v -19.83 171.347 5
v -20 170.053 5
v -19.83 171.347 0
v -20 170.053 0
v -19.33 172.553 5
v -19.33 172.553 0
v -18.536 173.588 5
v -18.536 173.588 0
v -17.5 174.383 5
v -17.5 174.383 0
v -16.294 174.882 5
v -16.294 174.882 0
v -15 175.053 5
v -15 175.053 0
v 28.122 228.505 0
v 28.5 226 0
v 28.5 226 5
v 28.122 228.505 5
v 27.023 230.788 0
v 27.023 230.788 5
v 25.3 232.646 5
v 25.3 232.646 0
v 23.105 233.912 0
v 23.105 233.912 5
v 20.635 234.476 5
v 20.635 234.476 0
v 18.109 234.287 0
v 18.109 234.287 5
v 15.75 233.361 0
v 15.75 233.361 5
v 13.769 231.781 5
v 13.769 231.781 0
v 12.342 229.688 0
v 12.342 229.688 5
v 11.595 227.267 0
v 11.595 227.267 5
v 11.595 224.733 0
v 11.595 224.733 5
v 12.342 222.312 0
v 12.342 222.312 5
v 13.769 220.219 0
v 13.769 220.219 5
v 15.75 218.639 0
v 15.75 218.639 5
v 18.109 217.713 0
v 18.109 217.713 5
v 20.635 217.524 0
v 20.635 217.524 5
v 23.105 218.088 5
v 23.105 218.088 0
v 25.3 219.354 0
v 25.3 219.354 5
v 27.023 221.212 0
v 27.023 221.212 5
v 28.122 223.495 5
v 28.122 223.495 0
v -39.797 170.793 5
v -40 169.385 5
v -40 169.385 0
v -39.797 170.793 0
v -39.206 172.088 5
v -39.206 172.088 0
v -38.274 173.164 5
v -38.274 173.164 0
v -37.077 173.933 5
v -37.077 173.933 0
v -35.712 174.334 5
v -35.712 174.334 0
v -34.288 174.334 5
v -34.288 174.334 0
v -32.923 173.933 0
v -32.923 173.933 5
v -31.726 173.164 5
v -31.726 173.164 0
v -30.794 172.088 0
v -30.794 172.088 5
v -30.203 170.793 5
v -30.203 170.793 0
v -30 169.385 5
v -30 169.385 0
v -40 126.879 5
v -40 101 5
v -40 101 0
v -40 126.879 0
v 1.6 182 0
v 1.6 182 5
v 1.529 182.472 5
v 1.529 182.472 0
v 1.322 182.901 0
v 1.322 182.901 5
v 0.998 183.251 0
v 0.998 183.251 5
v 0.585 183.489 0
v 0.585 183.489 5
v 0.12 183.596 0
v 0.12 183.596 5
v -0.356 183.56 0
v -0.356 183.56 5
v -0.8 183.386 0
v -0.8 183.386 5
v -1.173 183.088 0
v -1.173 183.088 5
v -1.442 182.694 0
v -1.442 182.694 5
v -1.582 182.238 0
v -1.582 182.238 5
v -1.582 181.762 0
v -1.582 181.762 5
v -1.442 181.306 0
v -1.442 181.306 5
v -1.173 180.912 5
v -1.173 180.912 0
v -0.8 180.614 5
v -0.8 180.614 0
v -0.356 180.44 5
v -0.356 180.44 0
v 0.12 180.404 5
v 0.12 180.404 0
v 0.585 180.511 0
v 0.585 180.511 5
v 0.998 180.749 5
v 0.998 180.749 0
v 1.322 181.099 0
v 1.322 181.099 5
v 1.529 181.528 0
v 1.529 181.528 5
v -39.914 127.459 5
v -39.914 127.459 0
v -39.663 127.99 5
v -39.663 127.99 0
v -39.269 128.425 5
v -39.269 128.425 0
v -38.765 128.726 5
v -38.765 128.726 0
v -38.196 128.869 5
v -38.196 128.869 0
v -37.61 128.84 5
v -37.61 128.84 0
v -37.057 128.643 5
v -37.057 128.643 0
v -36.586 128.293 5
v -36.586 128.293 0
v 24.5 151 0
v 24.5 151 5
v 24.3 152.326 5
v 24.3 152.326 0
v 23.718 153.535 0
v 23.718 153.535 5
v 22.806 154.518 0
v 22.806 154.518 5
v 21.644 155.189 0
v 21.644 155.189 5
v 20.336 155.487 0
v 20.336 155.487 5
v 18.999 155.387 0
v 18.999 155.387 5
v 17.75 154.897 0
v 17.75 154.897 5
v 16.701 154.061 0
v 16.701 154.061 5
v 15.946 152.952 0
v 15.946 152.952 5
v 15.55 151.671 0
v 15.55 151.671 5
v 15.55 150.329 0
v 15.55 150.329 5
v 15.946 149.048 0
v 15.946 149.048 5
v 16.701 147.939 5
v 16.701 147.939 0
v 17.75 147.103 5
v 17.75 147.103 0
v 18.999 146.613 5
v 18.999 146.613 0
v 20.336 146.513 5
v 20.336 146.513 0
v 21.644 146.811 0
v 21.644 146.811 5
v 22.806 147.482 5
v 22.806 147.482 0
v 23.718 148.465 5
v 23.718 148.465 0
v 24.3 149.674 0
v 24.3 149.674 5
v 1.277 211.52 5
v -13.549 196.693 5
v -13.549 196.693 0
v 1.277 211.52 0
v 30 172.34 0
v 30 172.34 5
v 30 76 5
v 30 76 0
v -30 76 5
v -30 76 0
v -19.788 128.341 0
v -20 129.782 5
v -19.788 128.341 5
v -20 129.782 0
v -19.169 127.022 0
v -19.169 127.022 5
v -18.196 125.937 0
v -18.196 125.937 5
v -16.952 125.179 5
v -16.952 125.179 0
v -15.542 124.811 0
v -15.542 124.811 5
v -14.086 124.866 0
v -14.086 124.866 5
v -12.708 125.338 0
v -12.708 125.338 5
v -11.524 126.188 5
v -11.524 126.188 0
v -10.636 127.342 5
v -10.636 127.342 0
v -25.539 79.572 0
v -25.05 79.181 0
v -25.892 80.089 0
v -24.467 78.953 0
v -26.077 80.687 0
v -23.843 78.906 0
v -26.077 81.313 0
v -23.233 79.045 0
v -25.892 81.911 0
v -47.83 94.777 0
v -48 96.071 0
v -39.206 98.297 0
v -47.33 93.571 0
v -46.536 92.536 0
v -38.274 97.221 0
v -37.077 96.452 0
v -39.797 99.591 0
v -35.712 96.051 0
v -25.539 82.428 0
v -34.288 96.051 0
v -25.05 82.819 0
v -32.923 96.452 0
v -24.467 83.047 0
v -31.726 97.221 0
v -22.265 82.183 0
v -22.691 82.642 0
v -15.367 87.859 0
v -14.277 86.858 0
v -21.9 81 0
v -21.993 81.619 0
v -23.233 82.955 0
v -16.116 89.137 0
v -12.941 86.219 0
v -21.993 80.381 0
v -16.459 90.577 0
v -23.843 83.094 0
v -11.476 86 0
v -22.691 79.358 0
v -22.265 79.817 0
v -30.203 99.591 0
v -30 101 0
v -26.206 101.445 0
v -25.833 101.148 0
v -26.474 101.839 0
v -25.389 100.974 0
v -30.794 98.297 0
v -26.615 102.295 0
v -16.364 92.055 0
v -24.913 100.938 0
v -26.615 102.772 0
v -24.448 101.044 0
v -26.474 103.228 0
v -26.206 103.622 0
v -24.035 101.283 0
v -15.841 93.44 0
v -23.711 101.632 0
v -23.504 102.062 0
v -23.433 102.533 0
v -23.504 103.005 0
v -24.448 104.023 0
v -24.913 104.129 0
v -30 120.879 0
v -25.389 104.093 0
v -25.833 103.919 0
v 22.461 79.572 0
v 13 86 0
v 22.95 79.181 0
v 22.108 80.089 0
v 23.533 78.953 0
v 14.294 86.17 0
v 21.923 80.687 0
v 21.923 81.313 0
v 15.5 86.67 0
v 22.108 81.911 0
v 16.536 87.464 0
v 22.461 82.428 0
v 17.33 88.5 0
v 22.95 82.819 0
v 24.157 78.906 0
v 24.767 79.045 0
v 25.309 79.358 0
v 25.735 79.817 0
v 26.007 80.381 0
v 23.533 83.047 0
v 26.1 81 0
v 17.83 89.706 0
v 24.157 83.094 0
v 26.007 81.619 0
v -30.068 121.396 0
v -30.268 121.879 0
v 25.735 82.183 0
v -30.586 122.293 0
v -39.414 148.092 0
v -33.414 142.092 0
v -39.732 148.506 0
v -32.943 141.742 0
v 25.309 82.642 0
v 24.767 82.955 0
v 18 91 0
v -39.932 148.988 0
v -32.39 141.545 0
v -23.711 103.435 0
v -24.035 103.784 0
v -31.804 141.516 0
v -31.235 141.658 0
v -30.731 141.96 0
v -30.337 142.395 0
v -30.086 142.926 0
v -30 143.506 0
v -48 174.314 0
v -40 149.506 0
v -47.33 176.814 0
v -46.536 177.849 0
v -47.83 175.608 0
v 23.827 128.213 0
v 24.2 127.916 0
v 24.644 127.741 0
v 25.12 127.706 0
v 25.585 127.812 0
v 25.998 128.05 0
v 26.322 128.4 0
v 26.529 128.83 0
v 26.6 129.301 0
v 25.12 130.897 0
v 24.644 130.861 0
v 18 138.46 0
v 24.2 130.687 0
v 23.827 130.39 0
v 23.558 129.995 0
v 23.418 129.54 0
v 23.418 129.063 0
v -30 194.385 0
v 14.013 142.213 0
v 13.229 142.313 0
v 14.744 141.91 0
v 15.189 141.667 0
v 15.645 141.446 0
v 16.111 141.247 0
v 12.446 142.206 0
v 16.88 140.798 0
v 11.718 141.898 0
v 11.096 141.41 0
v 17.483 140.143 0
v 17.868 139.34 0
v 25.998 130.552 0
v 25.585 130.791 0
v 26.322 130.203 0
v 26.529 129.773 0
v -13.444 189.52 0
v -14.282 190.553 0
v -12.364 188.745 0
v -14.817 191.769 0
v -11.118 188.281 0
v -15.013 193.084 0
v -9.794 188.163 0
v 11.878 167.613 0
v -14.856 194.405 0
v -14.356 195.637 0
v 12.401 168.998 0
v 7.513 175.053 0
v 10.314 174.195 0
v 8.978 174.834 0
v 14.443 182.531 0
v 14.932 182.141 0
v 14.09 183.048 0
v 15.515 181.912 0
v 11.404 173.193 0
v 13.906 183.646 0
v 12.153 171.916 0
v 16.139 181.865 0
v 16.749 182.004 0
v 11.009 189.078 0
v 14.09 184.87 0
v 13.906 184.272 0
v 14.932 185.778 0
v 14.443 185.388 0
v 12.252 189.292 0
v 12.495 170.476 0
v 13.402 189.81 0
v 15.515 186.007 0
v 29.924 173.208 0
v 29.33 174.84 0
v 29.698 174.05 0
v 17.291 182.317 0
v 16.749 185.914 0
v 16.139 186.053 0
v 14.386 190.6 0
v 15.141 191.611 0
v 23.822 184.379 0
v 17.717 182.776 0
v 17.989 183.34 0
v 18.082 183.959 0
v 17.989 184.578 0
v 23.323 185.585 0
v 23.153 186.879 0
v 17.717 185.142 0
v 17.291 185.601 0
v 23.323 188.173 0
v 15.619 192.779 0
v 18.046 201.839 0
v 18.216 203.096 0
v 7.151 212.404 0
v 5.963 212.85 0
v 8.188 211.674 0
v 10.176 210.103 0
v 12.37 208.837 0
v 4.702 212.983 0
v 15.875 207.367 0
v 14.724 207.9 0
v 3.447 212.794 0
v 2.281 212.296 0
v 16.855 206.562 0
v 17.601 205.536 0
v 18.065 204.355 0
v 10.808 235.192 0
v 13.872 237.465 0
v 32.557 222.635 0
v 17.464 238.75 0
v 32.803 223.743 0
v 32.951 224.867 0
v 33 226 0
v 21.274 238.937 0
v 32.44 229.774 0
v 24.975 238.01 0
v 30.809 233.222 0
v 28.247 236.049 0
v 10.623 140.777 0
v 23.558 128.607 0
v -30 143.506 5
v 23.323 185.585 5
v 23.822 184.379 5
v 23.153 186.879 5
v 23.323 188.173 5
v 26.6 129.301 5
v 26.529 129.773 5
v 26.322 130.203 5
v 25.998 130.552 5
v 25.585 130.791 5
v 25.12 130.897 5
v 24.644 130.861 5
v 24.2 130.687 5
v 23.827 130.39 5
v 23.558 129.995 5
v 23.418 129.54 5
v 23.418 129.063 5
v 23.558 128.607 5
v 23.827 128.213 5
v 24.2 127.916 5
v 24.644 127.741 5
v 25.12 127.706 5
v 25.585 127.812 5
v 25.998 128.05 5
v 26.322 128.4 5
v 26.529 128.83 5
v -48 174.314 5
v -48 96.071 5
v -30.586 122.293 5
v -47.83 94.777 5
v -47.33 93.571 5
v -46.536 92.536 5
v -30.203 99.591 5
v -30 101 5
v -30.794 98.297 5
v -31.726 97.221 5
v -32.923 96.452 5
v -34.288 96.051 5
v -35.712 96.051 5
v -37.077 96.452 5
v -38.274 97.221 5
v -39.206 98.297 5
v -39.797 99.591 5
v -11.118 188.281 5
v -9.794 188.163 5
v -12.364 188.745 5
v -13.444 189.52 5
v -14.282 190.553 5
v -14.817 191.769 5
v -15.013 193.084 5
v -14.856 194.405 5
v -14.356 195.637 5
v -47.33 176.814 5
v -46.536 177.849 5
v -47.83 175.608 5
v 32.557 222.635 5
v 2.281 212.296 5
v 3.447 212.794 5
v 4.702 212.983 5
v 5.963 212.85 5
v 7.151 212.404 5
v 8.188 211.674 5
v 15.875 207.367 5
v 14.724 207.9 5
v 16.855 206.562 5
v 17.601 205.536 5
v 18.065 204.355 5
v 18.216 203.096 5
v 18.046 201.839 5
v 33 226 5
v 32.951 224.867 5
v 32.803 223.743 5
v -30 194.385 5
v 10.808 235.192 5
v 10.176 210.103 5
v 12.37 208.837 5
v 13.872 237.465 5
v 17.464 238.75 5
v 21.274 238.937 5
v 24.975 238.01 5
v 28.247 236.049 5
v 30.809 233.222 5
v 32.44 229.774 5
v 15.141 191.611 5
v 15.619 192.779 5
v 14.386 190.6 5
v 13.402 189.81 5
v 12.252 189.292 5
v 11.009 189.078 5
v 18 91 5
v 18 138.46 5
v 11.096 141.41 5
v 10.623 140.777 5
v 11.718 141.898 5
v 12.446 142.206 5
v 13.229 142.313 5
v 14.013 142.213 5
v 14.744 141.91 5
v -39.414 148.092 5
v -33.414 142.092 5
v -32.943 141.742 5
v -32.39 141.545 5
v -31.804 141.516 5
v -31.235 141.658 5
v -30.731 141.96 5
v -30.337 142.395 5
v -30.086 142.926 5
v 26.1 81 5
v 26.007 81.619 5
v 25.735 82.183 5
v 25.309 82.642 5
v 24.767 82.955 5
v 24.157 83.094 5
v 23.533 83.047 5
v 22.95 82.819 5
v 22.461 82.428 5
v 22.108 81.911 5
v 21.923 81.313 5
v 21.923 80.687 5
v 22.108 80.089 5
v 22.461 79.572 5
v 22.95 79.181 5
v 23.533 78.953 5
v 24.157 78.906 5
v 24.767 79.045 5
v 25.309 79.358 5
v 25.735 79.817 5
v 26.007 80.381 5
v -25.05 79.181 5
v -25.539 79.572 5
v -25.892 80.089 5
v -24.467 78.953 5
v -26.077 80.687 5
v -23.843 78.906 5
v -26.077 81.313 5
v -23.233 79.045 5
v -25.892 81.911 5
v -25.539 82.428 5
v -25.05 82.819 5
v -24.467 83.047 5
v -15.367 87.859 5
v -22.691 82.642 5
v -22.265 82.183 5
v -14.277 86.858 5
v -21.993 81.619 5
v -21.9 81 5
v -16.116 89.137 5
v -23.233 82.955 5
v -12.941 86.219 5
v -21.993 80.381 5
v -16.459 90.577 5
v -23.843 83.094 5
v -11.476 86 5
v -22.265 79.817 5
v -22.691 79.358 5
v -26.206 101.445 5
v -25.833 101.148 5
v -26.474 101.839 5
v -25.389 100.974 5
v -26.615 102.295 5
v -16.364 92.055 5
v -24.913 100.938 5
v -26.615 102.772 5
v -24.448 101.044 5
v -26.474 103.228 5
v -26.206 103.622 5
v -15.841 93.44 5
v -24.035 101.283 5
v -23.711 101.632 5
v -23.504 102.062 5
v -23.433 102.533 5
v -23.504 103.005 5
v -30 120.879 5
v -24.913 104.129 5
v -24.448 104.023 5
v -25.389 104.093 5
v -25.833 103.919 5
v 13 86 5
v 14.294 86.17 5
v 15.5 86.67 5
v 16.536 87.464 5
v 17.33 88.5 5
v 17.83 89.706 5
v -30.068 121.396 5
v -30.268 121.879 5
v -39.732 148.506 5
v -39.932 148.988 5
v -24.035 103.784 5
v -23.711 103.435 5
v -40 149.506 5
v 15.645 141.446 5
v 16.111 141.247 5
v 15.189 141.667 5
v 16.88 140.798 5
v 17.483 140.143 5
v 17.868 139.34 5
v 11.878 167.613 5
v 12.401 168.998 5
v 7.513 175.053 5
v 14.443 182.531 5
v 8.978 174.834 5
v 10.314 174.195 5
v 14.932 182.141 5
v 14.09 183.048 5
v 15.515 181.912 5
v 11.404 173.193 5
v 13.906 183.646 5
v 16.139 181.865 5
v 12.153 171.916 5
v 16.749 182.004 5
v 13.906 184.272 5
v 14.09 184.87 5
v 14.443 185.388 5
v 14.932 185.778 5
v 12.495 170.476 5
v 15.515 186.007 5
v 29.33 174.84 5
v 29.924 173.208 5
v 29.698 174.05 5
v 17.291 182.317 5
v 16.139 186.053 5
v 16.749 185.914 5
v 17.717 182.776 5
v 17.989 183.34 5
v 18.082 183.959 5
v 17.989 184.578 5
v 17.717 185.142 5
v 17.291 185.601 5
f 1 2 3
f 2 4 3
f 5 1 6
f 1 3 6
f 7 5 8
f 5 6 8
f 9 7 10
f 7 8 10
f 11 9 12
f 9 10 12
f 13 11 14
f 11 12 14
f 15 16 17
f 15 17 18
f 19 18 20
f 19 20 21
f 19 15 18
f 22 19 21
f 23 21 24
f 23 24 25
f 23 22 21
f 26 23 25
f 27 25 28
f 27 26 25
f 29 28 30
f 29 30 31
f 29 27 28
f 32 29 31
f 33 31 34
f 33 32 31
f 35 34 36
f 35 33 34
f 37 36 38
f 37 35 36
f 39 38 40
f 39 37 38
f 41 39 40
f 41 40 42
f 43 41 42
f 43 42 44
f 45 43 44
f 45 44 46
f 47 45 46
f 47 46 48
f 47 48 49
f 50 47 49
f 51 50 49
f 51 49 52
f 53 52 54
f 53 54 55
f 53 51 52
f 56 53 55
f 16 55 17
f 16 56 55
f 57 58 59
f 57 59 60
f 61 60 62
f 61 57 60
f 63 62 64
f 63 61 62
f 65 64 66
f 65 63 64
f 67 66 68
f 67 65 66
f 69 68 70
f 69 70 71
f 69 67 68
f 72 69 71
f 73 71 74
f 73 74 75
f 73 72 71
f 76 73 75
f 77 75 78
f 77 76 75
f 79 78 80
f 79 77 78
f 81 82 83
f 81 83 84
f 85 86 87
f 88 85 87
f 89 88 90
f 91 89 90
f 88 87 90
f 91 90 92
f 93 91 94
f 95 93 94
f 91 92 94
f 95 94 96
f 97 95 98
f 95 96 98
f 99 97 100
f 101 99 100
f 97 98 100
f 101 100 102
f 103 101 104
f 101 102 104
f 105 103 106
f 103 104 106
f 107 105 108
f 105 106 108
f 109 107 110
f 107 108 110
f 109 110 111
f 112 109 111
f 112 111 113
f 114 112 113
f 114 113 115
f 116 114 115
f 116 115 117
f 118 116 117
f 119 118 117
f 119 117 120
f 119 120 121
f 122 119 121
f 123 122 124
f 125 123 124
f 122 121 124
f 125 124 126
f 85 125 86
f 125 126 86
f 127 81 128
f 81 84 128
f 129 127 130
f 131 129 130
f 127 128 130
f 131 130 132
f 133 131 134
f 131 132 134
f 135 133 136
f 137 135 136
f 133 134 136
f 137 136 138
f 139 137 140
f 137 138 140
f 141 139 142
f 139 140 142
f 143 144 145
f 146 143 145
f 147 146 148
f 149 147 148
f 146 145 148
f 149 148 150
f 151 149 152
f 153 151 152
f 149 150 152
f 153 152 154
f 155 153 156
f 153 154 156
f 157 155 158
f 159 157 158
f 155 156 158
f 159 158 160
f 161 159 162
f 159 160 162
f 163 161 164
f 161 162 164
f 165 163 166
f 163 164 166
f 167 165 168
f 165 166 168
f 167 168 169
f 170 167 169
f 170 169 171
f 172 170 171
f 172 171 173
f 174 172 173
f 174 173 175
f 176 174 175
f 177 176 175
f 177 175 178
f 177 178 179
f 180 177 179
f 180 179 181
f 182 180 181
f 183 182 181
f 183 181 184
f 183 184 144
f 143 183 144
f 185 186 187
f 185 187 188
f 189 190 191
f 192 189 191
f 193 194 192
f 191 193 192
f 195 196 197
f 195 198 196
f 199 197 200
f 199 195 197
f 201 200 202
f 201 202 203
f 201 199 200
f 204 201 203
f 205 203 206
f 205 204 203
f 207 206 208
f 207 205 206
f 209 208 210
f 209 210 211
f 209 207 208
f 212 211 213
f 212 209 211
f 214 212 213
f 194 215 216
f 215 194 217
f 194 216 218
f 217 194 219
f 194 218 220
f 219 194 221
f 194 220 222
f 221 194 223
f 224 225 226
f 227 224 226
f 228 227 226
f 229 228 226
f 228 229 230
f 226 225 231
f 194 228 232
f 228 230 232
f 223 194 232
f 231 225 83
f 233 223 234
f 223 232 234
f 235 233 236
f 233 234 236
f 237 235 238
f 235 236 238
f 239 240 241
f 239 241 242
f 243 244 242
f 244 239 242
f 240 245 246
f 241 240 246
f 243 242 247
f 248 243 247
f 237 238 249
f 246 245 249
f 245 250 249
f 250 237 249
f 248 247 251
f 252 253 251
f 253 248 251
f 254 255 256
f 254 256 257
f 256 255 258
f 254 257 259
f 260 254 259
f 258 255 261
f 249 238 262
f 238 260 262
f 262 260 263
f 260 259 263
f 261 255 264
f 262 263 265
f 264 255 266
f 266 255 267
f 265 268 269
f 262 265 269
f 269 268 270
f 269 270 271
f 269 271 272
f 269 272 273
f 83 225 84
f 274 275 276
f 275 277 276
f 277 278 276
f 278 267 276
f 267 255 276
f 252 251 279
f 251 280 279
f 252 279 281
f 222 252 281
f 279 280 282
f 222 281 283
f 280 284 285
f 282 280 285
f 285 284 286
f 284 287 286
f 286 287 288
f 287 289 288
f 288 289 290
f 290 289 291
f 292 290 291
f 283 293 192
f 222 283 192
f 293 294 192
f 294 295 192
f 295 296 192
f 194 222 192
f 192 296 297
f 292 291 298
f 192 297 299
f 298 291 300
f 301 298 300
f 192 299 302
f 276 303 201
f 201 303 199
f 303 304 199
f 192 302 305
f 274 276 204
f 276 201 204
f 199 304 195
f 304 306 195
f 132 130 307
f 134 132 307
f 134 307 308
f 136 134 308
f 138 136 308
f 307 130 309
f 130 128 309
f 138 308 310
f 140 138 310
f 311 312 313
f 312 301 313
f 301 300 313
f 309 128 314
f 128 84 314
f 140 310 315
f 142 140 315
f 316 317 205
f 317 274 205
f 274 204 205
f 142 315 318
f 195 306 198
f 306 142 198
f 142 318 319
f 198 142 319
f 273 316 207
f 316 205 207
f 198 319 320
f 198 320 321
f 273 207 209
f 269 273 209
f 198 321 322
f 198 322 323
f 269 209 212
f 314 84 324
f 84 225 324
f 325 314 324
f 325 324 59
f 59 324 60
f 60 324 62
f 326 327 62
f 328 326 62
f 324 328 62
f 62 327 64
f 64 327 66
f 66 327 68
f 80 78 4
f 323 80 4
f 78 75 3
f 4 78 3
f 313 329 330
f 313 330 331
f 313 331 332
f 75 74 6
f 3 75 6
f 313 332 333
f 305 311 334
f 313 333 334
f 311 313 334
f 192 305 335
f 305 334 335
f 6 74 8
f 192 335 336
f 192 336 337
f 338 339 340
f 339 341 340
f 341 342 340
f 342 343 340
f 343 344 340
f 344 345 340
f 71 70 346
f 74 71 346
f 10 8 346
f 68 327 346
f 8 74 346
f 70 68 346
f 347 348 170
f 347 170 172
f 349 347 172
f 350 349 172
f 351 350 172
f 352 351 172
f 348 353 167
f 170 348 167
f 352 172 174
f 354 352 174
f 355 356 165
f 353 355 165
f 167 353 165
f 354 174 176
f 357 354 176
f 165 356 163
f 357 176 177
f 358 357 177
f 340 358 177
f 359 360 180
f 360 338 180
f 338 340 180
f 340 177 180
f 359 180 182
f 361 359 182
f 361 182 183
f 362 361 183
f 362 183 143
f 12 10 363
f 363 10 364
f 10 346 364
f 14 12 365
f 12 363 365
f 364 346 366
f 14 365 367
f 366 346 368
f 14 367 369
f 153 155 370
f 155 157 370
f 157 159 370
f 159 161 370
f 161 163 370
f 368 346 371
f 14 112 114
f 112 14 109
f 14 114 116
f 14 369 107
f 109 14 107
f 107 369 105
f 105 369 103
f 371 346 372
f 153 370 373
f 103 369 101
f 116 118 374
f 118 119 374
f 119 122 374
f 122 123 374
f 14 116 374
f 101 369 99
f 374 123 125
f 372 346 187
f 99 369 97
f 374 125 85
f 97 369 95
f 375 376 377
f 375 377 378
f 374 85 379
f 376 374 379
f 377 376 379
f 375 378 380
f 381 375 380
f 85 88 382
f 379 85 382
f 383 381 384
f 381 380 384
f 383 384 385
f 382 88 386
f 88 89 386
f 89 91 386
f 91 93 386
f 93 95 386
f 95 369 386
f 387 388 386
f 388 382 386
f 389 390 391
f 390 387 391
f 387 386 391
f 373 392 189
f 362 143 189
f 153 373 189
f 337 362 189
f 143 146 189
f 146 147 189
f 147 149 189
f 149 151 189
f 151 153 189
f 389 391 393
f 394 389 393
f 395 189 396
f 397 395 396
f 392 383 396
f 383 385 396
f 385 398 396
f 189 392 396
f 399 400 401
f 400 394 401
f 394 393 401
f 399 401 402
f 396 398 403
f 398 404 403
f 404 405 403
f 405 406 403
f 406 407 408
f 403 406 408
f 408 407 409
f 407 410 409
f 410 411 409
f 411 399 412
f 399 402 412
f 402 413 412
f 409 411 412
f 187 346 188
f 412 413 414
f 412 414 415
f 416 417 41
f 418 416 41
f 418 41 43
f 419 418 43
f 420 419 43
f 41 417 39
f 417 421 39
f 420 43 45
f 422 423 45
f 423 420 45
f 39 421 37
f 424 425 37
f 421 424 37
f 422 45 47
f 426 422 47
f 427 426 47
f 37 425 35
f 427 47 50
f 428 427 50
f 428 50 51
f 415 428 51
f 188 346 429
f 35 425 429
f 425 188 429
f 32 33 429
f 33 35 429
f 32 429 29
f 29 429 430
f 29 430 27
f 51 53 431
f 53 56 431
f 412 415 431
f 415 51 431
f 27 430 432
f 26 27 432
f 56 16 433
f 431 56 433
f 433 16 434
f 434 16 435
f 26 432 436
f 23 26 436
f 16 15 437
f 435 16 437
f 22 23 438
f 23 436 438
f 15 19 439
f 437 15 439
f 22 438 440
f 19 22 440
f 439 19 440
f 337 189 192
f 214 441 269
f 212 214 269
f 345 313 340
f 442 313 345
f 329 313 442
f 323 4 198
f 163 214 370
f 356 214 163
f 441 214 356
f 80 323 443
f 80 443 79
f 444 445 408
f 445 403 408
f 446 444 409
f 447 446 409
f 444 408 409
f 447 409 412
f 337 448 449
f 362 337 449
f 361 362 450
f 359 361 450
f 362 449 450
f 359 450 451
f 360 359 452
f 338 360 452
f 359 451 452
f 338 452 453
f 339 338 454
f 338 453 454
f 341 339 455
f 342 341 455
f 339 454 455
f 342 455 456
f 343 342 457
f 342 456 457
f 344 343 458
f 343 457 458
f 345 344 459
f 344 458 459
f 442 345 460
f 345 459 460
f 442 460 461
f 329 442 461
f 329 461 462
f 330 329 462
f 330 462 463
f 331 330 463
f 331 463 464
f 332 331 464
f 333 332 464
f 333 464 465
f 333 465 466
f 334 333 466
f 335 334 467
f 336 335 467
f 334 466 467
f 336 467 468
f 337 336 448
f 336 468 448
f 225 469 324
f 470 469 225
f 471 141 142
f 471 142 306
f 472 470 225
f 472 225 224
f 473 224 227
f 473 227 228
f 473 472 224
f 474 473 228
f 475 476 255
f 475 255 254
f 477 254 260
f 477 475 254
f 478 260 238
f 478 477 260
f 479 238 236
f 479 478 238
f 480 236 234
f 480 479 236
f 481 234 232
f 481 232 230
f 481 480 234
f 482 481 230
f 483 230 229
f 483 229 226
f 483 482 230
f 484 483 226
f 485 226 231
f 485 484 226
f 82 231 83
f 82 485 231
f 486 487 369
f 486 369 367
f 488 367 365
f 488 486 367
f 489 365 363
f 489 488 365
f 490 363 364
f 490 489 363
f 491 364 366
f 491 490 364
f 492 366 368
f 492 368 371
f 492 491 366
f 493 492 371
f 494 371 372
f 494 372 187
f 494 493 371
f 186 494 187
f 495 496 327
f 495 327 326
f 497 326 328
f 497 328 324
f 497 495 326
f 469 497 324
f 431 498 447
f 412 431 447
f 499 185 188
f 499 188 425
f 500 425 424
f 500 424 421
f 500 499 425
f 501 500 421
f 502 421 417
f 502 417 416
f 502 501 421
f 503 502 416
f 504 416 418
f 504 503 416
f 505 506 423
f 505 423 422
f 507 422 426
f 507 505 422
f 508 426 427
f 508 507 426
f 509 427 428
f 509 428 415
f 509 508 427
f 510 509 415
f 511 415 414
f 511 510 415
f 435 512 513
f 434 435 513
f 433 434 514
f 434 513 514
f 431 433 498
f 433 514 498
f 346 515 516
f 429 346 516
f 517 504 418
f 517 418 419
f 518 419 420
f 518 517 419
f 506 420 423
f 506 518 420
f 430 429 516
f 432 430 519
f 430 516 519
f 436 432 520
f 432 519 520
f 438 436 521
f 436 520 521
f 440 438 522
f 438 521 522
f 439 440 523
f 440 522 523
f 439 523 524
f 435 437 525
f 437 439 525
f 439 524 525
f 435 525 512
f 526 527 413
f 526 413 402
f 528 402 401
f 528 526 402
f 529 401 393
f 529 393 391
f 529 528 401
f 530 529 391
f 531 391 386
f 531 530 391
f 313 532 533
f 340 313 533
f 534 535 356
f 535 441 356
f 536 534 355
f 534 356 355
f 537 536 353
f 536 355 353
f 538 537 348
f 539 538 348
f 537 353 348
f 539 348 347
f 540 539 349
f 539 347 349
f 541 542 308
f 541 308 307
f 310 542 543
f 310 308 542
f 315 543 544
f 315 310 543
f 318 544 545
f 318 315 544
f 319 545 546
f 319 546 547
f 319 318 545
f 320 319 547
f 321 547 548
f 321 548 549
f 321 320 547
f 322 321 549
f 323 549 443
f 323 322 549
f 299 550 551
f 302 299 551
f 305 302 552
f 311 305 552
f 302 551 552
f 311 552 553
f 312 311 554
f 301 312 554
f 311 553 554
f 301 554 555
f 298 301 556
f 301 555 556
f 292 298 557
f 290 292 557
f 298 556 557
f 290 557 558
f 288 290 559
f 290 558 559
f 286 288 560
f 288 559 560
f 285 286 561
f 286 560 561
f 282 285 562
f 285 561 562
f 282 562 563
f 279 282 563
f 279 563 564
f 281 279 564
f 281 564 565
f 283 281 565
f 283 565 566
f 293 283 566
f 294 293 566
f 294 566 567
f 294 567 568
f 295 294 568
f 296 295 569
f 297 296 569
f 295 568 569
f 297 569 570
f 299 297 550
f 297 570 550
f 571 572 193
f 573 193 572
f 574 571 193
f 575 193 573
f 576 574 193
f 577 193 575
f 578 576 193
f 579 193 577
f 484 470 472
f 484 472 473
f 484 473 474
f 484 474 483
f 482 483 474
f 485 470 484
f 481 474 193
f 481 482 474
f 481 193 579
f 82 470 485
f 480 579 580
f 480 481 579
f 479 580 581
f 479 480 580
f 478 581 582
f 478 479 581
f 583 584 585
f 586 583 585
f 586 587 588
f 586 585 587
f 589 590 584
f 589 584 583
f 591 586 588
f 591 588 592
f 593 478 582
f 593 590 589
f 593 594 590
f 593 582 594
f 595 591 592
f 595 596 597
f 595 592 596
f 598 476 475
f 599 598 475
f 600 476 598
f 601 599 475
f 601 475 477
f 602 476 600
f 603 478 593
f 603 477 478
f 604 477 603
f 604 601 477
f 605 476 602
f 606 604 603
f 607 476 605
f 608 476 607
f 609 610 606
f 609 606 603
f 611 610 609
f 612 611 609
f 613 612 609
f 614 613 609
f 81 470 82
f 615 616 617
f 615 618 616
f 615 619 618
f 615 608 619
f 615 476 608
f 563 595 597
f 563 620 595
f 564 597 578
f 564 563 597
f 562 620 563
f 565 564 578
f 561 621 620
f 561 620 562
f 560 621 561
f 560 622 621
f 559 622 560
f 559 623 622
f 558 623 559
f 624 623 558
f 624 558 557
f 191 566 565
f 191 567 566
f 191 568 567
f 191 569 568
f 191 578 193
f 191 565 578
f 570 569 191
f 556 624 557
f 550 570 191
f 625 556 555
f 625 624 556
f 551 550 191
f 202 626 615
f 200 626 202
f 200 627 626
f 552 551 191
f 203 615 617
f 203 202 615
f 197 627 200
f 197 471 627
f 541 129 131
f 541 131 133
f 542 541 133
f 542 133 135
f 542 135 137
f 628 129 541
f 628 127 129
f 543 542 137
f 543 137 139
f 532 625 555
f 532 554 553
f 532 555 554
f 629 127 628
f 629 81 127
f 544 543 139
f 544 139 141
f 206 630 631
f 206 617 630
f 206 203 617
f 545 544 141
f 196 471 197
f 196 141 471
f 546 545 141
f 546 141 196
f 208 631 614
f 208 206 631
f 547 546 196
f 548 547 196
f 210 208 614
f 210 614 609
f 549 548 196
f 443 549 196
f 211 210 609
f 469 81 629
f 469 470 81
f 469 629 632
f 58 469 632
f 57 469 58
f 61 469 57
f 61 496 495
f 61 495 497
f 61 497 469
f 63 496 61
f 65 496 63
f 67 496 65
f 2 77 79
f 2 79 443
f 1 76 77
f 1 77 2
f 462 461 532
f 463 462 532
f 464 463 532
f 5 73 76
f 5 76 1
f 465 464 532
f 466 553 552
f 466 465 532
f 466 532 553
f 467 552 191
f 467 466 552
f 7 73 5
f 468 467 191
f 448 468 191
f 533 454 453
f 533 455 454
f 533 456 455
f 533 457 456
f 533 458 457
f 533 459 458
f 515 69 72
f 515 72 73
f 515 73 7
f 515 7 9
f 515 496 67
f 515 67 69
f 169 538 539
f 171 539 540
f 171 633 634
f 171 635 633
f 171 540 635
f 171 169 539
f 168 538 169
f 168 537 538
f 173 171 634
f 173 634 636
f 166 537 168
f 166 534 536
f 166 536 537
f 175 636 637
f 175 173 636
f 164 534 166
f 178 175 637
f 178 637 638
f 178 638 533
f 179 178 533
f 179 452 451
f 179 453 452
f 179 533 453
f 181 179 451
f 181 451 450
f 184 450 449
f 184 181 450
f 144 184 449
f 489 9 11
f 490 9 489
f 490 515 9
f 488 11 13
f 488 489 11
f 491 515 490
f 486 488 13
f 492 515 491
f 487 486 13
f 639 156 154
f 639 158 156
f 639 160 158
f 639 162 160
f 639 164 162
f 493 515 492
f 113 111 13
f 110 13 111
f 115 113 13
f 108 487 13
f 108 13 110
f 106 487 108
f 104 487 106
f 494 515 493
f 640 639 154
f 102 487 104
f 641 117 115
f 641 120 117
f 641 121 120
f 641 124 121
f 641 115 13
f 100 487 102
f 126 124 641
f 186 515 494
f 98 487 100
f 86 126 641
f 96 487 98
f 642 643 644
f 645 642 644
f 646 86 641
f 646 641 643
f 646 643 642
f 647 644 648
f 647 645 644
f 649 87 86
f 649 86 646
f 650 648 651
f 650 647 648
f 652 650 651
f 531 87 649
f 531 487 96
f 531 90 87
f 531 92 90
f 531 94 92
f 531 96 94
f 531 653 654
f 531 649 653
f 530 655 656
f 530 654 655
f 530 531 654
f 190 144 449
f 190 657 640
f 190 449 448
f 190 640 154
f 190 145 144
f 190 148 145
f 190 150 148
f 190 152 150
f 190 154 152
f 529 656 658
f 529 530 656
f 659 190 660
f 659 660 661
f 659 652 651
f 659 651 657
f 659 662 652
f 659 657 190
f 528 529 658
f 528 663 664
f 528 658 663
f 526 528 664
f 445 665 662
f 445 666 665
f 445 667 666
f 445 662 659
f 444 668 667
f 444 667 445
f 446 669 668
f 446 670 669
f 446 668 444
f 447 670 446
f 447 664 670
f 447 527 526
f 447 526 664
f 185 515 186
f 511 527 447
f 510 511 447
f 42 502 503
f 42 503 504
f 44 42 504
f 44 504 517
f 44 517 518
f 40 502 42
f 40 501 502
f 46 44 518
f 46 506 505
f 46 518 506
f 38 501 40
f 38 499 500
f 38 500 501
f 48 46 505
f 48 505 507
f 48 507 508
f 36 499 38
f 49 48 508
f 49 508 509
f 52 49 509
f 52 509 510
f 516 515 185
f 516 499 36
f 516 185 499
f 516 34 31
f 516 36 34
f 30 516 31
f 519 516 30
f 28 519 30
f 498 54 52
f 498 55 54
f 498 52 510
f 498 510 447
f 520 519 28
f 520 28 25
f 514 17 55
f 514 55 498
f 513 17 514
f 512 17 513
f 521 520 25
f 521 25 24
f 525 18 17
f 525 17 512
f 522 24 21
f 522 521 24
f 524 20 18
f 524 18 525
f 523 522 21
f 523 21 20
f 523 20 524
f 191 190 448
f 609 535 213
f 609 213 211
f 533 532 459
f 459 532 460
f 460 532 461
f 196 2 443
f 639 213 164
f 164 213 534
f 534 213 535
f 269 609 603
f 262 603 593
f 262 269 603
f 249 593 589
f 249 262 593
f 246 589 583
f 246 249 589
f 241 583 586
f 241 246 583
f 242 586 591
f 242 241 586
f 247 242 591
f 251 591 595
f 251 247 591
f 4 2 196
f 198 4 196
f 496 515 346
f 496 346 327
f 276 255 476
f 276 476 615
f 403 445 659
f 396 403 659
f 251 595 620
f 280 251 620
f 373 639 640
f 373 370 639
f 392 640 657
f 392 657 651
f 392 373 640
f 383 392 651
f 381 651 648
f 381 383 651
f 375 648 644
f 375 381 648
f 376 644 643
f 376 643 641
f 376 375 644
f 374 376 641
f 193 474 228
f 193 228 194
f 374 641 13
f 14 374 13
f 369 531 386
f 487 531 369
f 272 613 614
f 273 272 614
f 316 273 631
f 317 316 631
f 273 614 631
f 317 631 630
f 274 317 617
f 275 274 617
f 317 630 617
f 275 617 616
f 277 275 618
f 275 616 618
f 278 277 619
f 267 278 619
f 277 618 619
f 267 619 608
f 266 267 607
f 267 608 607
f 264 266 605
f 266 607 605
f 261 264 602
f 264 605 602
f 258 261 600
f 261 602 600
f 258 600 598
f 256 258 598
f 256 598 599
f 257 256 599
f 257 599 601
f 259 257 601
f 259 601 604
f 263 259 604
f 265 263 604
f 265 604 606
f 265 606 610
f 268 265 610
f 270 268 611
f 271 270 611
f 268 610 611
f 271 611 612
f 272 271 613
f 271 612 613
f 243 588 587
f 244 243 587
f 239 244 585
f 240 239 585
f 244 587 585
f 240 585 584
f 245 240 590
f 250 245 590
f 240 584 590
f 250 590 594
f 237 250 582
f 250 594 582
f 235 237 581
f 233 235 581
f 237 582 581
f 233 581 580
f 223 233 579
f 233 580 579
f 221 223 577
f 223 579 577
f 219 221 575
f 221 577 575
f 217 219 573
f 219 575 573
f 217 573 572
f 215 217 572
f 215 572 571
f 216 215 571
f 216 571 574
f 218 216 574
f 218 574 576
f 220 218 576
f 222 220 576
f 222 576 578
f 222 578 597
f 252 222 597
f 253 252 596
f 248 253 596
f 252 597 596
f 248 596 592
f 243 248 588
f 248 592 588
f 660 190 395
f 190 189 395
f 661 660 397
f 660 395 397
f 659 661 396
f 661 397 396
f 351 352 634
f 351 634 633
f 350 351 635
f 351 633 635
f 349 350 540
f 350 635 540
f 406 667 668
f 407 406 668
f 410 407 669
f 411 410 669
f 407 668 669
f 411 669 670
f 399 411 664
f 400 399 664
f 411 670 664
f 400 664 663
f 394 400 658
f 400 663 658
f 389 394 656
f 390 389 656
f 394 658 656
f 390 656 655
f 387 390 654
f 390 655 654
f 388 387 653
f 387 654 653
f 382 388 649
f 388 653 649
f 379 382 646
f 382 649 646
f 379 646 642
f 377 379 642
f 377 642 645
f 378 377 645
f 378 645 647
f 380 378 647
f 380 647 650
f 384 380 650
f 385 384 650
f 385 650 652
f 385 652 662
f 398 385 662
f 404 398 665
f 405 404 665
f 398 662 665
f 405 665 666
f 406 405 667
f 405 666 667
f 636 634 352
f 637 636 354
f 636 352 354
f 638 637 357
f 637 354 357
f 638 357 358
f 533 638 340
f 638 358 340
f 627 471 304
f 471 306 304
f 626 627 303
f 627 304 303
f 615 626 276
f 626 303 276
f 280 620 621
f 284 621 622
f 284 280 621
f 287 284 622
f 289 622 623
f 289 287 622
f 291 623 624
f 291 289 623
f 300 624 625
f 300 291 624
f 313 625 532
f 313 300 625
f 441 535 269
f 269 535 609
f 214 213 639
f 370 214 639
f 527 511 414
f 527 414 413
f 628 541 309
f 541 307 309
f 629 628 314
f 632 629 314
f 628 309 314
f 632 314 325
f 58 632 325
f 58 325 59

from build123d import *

# Parameters (mm, degrees)
SKETCH1_W           = 80
SKETCH1_H           = 180
SKETCH1_R           = 8.5
BOSS_EXTRUDE1_DEPTH = 5
SKETCH2_R           = 4.5
CUT_EXTRUDE1_DEPTH  = 30
SKETCH3_R           = 1.6
SKETCH3_R_2         = 2.5
CUT_EXTRUDE2_DEPTH  = 5
CUT_EXTRUDE3_DEPTH  = 10
BOSS_EXTRUDE2_DEPTH = 5
FILLET1_R           = 2
FILLET2_R           = 5
SKETCH6_R           = 2.1
CUT_EXTRUDE4_DEPTH  = 5
SKETCH7_W           = 60
SKETCH7_H           = 19.778044947
BOSS_EXTRUDE3_DEPTH = 5
SKETCH8_R           = 2.1
CUT_EXTRUDE6_DEPTH  = 5
CUT_EXTRUDE7_DEPTH  = 5
CUT_EXTRUDE8_DEPTH  = 10
FILLET3_R           = 5
FILLET4_R           = 3


with BuildPart() as part:
    # Sketch1 → Boss-Extrude1 (new body)
    with BuildSketch(Plane.XY):
        with Locations((10, 166)):
            Rectangle(SKETCH1_W, SKETCH1_H)
        with Locations((20, 226)):
            Circle(SKETCH1_R, mode=Mode.SUBTRACT)
    extrude(amount=BOSS_EXTRUDE1_DEPTH)

    # Sketch2 → Cut-Extrude1 (cut)
    with BuildSketch(Plane.XY.offset(5)):
        with Locations((20, 151)):
            Circle(SKETCH2_R)
    extrude(amount=-CUT_EXTRUDE1_DEPTH, mode=Mode.SUBTRACT)

    # Sketch3 → Cut-Extrude2 (cut)
    with BuildSketch(Plane.XY.offset(5)):
        with Locations((0, 182)):
            Circle(SKETCH3_R)
        with Locations((25, 129.301270189)):
            Circle(SKETCH3_R)
        with Locations((-25.032859693, 102.533479235)):
            Circle(SKETCH3_R)
        with Locations((-15, 81)):
            Circle(SKETCH3_R_2)
        with Locations((15, 81)):
            Circle(SKETCH3_R_2)
        with Locations((24, 91)):
            Circle(SKETCH3_R_2)
        with Locations((-24, 91)):
            Circle(SKETCH3_R_2)
    extrude(amount=-CUT_EXTRUDE2_DEPTH, mode=Mode.SUBTRACT)

    # Sketch4 → Cut-Extrude3 (cut)
    with BuildSketch(Plane.XY.offset(5)):
        with BuildLine():
            Line((-30, 194.384776311), (10.807611845, 235.192388155))
            ThreePointArc((10.807611845, 235.192388155), (24.974884621, 238.010433923), (33, 226))
            ThreePointArc((33, 226), (32.888783198, 224.303159501), (32.557035742, 222.635352414))
            Line((32.557035742, 222.635352414), (22.786943589, 186.172872106))
            Line((22.786943589, 186.172872106), (30, 173.679491924))
            Line((30, 173.679491924), (30, 76))
            Line((30, 76), (50, 76))
            Line((50, 76), (50, 256))
            Line((50, 256), (-30, 256))
            Line((-30, 256), (-30, 194.384776311))
        make_face()
    extrude(amount=-CUT_EXTRUDE3_DEPTH, mode=Mode.SUBTRACT)

    # Sketch5 → Boss-Extrude2 (add)
    with BuildSketch(Plane.XY.offset(5)):
        with BuildLine():
            Line((-30, 169.384776311), (-30, 194.384776311))
            Line((-30, 194.384776311), (-46.535533906, 177.849242405))
            ThreePointArc((-46.535533906, 177.849242405), (-47.619397663, 176.227125661), (-48, 174.313708499))
            Line((-48, 174.313708499), (-48, 96.071067812))
            ThreePointArc((-48, 96.071067812), (-47.619397663, 94.15765065), (-46.535533906, 92.535533906))
            Line((-46.535533906, 92.535533906), (-30, 76))
            Line((-30, 76), (-30, 101))
            ThreePointArc((-30, 101), (-35, 96), (-40, 101))
            Line((-40, 101), (-40, 131.707106781))
            Line((-40, 131.707106781), (-30, 121.707106781))
            Line((-30, 121.707106781), (-30, 138.67766953))
            Line((-30, 138.67766953), (-40, 148.67766953))
            Line((-40, 148.67766953), (-40, 169.384776311))
            ThreePointArc((-40, 169.384776311), (-35, 174.384776311), (-30, 169.384776311))
        make_face()
    extrude(amount=-BOSS_EXTRUDE2_DEPTH)

    # Fillet1
    fillet1_edges = [part.edges().sort_by_distance(p)[0] for p in [
        (-30, 121.707106781, 2.5),
        (-40, 131.707106781, 2.5),
        (-40, 148.67766953, 2.5),
        (-30, 138.67766953, 2.5),
    ]]
    fillet(fillet1_edges, radius=FILLET1_R)

    # Fillet2
    fillet2_edges = [part.edges().sort_by_distance(p)[0] for p in [
        (30, 173.679491924, 2.5),
        (22.786943589, 186.172872106, 2.5),
    ]]
    fillet(fillet2_edges, radius=FILLET2_R)

    # Sketch6 → Cut-Extrude4 (cut)
    with BuildSketch(Plane.XY.offset(5)):
        with Locations((15.982125076, 183.959163508)):
            Circle(SKETCH6_R)
    extrude(amount=-CUT_EXTRUDE4_DEPTH, mode=Mode.SUBTRACT)

    # Sketch7 → Boss-Extrude3 (add)
    with BuildSketch(Plane.XY.offset(5)):
        with Locations((0, 85.889022474)):
            Rectangle(SKETCH7_W, SKETCH7_H)
    extrude(amount=-BOSS_EXTRUDE3_DEPTH)

    # Sketch8 → Cut-Extrude6 (cut)
    with BuildSketch(Plane.XY.offset(5)):
        with Locations((-24, 81)):
            Circle(SKETCH8_R)
        with Locations((24, 81)):
            Circle(SKETCH8_R)
    extrude(amount=-CUT_EXTRUDE6_DEPTH, mode=Mode.SUBTRACT)

    # Sketch9 → Cut-Extrude7 (cut)
    with BuildSketch(Plane.XY.offset(5)):
        with BuildLine():
            Line((18.046029168, 201.838654795), (15.618513493, 192.779042959))
            ThreePointArc((15.618513493, 192.779042959), (13.91917225, 190.174254019), (11.008699323, 189.077972384))
            Line((11.008699323, 189.077972384), (-9.794056189, 188.162535924))
            ThreePointArc((-9.794056189, 188.162535924), (-14.590082182, 191.143181287), (-13.549405056, 196.693235631))
            Line((-13.549405056, 196.693235631), (1.27739155, 211.520032237))
            ThreePointArc((1.27739155, 211.520032237), (4.701786886, 212.983263), (8.18783091, 211.673673466))
            ThreePointArc((8.18783091, 211.673673466), (11.25, 209.430341871), (14.723866695, 207.900091446))
            ThreePointArc((14.723866695, 207.900091446), (17.601026512, 205.53588353), (18.046029168, 201.838654795))
        make_face()
    extrude(amount=-CUT_EXTRUDE7_DEPTH, mode=Mode.SUBTRACT)

    # Sketch10 → Cut-Extrude8 (cut)
    with BuildSketch(Plane.XY.offset(5)):
        Polygon((-20, 175.052757164), (-20, 110.591633523), (16.036879799, 175.052757164), align=None)
        with BuildLine():
            Line((12.329553187, 143.829627228), (-20, 86))
            Line((-20, 86), (18, 86))
            Line((18, 86), (18, 140.692235936))
            ThreePointArc((18, 140.692235936), (14.916675161, 141.812518921), (12.329553187, 143.829627228))
        make_face()
    extrude(amount=-CUT_EXTRUDE8_DEPTH, mode=Mode.SUBTRACT)

    # Fillet3
    fillet3_edges = [part.edges().sort_by_distance(p)[0] for p in [
        (18, 86, 2.5),
        (-20, 86, 2.5),
        (-20, 175.052757164, 2.5),
        (16.036879799, 175.052757164, 2.5),
        (-20, 110.591633523, 2.5),
    ]]
    fillet(fillet3_edges, radius=FILLET3_R)

    # Fillet4
    fillet4_edges = [part.edges().sort_by_distance(p)[0] for p in [
        (12.329553187, 143.829627228, 2.5),
        (18, 140.692235936, 2.5),
    ]]
    fillet(fillet4_edges, radius=FILLET4_R)


solid = part.part
